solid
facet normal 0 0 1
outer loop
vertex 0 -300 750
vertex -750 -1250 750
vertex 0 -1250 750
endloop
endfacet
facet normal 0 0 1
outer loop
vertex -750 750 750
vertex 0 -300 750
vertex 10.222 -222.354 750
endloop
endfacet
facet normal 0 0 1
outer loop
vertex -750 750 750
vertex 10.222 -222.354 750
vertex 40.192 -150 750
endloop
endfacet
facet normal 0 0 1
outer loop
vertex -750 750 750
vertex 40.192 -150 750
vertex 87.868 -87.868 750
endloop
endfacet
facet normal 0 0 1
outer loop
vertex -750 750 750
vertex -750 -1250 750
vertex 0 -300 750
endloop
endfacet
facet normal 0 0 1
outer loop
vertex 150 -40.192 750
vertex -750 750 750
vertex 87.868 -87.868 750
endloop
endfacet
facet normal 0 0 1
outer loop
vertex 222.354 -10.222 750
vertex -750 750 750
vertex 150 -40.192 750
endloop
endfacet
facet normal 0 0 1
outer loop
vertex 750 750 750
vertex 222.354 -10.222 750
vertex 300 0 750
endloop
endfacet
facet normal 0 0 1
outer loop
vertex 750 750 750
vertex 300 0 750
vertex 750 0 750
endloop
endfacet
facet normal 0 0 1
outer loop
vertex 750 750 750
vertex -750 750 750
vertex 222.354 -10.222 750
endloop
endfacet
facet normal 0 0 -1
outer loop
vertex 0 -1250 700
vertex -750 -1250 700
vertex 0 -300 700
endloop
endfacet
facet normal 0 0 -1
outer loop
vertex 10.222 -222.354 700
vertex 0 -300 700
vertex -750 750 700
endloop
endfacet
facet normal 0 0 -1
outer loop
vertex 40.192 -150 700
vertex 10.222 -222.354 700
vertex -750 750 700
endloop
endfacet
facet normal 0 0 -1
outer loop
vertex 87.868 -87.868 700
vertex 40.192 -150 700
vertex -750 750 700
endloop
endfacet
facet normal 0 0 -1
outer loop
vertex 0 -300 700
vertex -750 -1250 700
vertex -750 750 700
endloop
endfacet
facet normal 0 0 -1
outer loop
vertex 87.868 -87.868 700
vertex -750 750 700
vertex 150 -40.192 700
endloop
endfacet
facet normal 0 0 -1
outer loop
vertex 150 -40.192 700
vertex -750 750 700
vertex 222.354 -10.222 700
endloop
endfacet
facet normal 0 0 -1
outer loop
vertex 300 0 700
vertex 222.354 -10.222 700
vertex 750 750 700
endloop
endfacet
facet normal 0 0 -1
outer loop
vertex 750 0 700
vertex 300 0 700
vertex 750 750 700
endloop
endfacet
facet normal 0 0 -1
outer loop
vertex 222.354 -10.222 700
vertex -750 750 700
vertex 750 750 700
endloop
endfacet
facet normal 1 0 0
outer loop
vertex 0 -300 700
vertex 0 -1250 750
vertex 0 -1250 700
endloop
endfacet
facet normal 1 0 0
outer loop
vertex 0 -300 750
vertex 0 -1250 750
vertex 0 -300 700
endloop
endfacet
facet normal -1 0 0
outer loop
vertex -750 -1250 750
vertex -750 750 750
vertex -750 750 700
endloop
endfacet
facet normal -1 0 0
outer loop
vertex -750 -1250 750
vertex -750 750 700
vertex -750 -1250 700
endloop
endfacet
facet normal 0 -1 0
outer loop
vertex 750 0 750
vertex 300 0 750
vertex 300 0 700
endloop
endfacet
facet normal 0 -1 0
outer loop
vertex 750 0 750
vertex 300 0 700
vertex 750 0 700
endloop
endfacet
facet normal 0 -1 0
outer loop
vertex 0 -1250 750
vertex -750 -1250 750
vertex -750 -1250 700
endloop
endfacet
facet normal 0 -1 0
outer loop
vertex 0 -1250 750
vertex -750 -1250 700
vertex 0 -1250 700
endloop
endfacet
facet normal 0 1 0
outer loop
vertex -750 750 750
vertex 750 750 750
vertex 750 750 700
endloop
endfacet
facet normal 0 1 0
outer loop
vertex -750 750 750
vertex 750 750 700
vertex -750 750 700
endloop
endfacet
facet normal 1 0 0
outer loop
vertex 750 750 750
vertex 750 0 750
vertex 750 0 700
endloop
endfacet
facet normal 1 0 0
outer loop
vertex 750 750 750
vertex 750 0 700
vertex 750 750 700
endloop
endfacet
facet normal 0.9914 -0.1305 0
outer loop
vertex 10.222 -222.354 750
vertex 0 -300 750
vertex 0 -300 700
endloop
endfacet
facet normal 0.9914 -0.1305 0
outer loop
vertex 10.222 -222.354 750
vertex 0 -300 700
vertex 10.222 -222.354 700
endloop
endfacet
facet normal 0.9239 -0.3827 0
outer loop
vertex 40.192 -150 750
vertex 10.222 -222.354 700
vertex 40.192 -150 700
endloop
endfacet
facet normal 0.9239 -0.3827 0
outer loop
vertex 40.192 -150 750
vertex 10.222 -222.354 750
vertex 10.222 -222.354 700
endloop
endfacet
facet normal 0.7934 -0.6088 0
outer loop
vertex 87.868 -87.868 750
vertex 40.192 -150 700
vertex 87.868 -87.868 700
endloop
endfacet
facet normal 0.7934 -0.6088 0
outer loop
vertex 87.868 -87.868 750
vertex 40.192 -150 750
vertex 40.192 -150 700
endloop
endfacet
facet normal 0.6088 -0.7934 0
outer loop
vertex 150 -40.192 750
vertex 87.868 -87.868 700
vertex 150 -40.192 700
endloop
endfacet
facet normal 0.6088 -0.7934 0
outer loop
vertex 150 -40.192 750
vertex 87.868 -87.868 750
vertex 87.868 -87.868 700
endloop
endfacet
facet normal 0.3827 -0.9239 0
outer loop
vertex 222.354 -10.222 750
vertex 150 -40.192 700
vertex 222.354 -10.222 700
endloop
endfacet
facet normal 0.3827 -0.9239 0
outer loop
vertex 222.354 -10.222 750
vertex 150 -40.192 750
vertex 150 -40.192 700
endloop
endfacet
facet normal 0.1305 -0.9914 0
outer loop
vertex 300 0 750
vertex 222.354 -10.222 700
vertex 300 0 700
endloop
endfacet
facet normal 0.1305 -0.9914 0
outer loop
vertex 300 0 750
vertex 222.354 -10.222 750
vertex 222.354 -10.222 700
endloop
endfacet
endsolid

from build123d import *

# Parameters (mm, degrees)
F9_DEPTH = 50


# Not quite as in the source:
# - the program builds the solid bodies; features that only make, move or delete a surface that nothing else refers to are left out


with BuildPart() as f9:
    # F3 (on offset) → F9 (new body)
    with BuildSketch(Plane.XY.offset(750)):
        with BuildLine():
            ThreePointArc((0, -300), (87.867965644, -87.867965644), (300, 0))
            Line((300, 0), (750, 0))
            Line((750, 0), (750, 750))
            Line((750, 750), (-750, 750))
            Line((-750, 750), (-750, -1250))
            Line((-750, -1250), (0, -1250))
            Line((0, -1250), (0, -300))
        make_face()
    extrude(amount=-F9_DEPTH)


solid = f9.part
